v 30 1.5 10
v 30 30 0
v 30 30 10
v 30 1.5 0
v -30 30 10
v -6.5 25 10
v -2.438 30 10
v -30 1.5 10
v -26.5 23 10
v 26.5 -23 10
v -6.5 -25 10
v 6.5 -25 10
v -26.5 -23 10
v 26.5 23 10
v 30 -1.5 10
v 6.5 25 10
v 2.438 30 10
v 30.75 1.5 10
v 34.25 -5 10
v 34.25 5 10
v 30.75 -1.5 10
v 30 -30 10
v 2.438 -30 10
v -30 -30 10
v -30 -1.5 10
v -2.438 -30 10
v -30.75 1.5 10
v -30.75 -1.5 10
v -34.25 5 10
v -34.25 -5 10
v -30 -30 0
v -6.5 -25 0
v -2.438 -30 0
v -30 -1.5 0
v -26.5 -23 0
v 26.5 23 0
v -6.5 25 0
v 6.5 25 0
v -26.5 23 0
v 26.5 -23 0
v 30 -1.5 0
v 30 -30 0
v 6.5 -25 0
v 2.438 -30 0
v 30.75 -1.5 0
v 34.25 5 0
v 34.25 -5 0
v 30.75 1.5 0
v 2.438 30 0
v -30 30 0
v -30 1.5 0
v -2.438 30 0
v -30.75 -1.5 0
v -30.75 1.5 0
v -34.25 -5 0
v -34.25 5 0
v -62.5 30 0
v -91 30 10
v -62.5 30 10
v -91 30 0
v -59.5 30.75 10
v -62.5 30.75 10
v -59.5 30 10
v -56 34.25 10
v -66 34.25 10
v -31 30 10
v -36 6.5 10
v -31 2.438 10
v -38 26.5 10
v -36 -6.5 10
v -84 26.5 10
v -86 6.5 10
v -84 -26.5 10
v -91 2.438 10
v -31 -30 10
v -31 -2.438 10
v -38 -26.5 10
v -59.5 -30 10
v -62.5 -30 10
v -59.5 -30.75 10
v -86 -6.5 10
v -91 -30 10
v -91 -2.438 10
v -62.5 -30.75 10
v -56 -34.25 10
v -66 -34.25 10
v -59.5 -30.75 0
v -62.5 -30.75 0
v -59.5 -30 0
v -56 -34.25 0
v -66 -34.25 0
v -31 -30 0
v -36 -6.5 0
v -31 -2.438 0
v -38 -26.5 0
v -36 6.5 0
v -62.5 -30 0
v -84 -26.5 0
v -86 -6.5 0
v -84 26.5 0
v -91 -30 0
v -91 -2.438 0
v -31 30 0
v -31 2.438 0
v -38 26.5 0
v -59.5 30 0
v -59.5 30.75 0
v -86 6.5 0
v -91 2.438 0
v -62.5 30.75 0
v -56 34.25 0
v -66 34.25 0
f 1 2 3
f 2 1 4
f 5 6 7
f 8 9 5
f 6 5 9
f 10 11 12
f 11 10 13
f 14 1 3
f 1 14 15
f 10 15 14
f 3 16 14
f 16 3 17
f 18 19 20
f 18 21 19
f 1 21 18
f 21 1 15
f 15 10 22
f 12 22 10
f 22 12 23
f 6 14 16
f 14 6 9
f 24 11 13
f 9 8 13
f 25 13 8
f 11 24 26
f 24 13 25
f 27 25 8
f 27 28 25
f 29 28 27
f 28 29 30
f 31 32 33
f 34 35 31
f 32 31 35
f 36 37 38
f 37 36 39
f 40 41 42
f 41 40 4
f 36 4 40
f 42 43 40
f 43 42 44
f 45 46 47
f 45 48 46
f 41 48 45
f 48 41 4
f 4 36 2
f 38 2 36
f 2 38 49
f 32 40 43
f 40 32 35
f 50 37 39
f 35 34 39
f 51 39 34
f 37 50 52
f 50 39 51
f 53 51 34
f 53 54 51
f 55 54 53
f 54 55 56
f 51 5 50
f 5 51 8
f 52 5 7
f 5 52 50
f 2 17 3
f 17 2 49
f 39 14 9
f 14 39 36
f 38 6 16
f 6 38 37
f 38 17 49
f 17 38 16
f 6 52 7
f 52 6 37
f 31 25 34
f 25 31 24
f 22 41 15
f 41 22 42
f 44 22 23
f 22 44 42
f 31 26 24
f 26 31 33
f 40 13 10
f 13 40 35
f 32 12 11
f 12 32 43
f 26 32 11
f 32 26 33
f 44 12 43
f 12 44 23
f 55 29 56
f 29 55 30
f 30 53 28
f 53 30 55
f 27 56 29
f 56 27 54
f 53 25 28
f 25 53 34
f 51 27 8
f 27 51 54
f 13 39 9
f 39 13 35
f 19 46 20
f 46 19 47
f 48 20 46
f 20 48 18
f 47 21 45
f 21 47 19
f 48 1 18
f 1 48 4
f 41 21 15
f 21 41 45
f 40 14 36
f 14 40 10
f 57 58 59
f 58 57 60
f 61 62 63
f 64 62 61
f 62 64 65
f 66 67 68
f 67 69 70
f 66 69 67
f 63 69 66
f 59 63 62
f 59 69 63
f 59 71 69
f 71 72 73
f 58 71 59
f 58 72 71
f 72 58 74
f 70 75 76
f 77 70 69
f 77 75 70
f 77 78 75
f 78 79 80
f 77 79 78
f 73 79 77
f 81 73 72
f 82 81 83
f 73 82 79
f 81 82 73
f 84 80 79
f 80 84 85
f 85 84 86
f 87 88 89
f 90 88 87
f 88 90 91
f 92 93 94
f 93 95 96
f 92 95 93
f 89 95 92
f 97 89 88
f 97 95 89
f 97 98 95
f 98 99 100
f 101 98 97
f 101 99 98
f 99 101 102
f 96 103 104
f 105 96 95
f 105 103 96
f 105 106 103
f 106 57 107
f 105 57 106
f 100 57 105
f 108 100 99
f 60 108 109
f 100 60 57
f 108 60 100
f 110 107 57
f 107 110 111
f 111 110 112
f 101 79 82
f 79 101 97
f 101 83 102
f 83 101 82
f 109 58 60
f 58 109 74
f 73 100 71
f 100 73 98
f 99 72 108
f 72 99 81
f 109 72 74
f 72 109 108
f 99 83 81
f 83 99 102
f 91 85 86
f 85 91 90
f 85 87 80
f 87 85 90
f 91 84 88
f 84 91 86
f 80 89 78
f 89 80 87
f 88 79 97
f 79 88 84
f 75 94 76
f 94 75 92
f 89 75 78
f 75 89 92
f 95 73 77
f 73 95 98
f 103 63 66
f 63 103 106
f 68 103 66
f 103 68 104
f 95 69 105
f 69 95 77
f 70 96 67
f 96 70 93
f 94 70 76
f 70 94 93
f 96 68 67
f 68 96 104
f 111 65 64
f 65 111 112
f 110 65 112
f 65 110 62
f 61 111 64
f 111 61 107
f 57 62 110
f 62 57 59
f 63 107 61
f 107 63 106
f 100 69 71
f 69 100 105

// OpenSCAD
union() {
	translate(v = [0, 30.0000000000, 0]) {
		difference() {
			union() {
				translate(v = [0, -1.7500000000, 0]) {
					translate(v = [0, 0, 5.0000000000]) {
						cube(center = true, size = [60, 3.5000000000, 10]);
					}
				}
				translate(v = [0, -3.5000000000, 0]) {
					translate(v = [0, -1.7500000000, 0]) {
						translate(v = [0, 0, 5.0000000000]) {
							cube(center = true, size = [60, 3.5000000000, 10]);
						}
					}
				}
			}
			translate(v = [0, -1.0000000000, 0]) {
				translate(v = [0, -4.0000000000, 0]) {
					translate(v = [-6.5000000000, 0, 0]) {
						linear_extrude(height = 10) {
							polygon(points = [[0, 0], [13, 0], [6.5000000000, 8]]);
						}
					}
				}
			}
		}
	}
	rotate(a = [0, 0, 180]) {
		translate(v = [0, 30.0000000000, 0]) {
			difference() {
				union() {
					translate(v = [0, -1.7500000000, 0]) {
						translate(v = [0, 0, 5.0000000000]) {
							cube(center = true, size = [60, 3.5000000000, 10]);
						}
					}
					translate(v = [0, -3.5000000000, 0]) {
						translate(v = [0, -1.7500000000, 0]) {
							translate(v = [0, 0, 5.0000000000]) {
								cube(center = true, size = [60, 3.5000000000, 10]);
							}
						}
					}
				}
				translate(v = [0, -1.0000000000, 0]) {
					translate(v = [0, -4.0000000000, 0]) {
						translate(v = [-6.5000000000, 0, 0]) {
							linear_extrude(height = 10) {
								polygon(points = [[0, 0], [13, 0], [6.5000000000, 8]]);
							}
						}
					}
				}
			}
		}
	}
	translate(v = [-30.0000000000, 0, 0]) {
		rotate(a = [0, 0, 90]) {
			union() {
				translate(v = [0, -1.7500000000, 0]) {
					translate(v = [0, 0, 5.0000000000]) {
						cube(center = true, size = [60, 3.5000000000, 10]);
					}
				}
				translate(v = [0, 1.7500000000, 0]) {
					rotate(a = [0, 0, 180]) {
						union() {
							translate(v = [0, -2.5000000000, 0]) {
								translate(v = [-5.0000000000, 0, 0]) {
									linear_extrude(height = 10) {
										polygon(points = [[0, 0], [10, 0], [5.0000000000, 5]]);
									}
								}
							}
							translate(v = [0, 2.5000000000, 0]) {
								translate(v = [0, 0, 5.0000000000]) {
									cube(center = true, size = [3, 3, 10]);
								}
							}
						}
					}
				}
			}
		}
	}
	rotate(a = [0, 0, 180]) {
		translate(v = [-30.0000000000, 0, 0]) {
			rotate(a = [0, 0, 90]) {
				union() {
					translate(v = [0, -1.7500000000, 0]) {
						translate(v = [0, 0, 5.0000000000]) {
							cube(center = true, size = [60, 3.5000000000, 10]);
						}
					}
					translate(v = [0, 1.7500000000, 0]) {
						rotate(a = [0, 0, 180]) {
							union() {
								translate(v = [0, -2.5000000000, 0]) {
									translate(v = [-5.0000000000, 0, 0]) {
										linear_extrude(height = 10) {
											polygon(points = [[0, 0], [10, 0], [5.0000000000, 5]]);
										}
									}
								}
								translate(v = [0, 2.5000000000, 0]) {
									translate(v = [0, 0, 5.0000000000]) {
										cube(center = true, size = [3, 3, 10]);
									}
								}
							}
						}
					}
				}
			}
		}
	}
	translate(v = [-61, 0, 0]) {
		rotate(a = [0, 0, 90]) {
			union() {
				translate(v = [0, 30.0000000000, 0]) {
					difference() {
						union() {
							translate(v = [0, -1.7500000000, 0]) {
								translate(v = [0, 0, 5.0000000000]) {
									cube(center = true, size = [60, 3.5000000000, 10]);
								}
							}
							translate(v = [0, -3.5000000000, 0]) {
								translate(v = [0, -1.7500000000, 0]) {
									translate(v = [0, 0, 5.0000000000]) {
										cube(center = true, size = [60, 3.5000000000, 10]);
									}
								}
							}
						}
						translate(v = [0, -1.0000000000, 0]) {
							translate(v = [0, -4.0000000000, 0]) {
								translate(v = [-6.5000000000, 0, 0]) {
									linear_extrude(height = 10) {
										polygon(points = [[0, 0], [13, 0], [6.5000000000, 8]]);
									}
								}
							}
						}
					}
				}
				rotate(a = [0, 0, 180]) {
					translate(v = [0, 30.0000000000, 0]) {
						difference() {
							union() {
								translate(v = [0, -1.7500000000, 0]) {
									translate(v = [0, 0, 5.0000000000]) {
										cube(center = true, size = [60, 3.5000000000, 10]);
									}
								}
								translate(v = [0, -3.5000000000, 0]) {
									translate(v = [0, -1.7500000000, 0]) {
										translate(v = [0, 0, 5.0000000000]) {
											cube(center = true, size = [60, 3.5000000000, 10]);
										}
									}
								}
							}
							translate(v = [0, -1.0000000000, 0]) {
								translate(v = [0, -4.0000000000, 0]) {
									translate(v = [-6.5000000000, 0, 0]) {
										linear_extrude(height = 10) {
											polygon(points = [[0, 0], [13, 0], [6.5000000000, 8]]);
										}
									}
								}
							}
						}
					}
				}
				translate(v = [-30.0000000000, 0, 0]) {
					rotate(a = [0, 0, 90]) {
						union() {
							translate(v = [0, -1.7500000000, 0]) {
								translate(v = [0, 0, 5.0000000000]) {
									cube(center = true, size = [60, 3.5000000000, 10]);
								}
							}
							translate(v = [0, 1.7500000000, 0]) {
								rotate(a = [0, 0, 180]) {
									union() {
										translate(v = [0, -2.5000000000, 0]) {
											translate(v = [-5.0000000000, 0, 0]) {
												linear_extrude(height = 10) {
													polygon(points = [[0, 0], [10, 0], [5.0000000000, 5]]);
												}
											}
										}
										translate(v = [0, 2.5000000000, 0]) {
											translate(v = [0, 0, 5.0000000000]) {
												cube(center = true, size = [3, 3, 10]);
											}
										}
									}
								}
							}
						}
					}
				}
				rotate(a = [0, 0, 180]) {
					translate(v = [-30.0000000000, 0, 0]) {
						rotate(a = [0, 0, 90]) {
							union() {
								translate(v = [0, -1.7500000000, 0]) {
									translate(v = [0, 0, 5.0000000000]) {
										cube(center = true, size = [60, 3.5000000000, 10]);
									}
								}
								translate(v = [0, 1.7500000000, 0]) {
									rotate(a = [0, 0, 180]) {
										union() {
											translate(v = [0, -2.5000000000, 0]) {
												translate(v = [-5.0000000000, 0, 0]) {
													linear_extrude(height = 10) {
														polygon(points = [[0, 0], [10, 0], [5.0000000000, 5]]);
													}
												}
											}
											translate(v = [0, 2.5000000000, 0]) {
												translate(v = [0, 0, 5.0000000000]) {
													cube(center = true, size = [3, 3, 10]);
												}
											}
										}
									}
								}
							}
						}
					}
				}
			}
		}
	}
}
